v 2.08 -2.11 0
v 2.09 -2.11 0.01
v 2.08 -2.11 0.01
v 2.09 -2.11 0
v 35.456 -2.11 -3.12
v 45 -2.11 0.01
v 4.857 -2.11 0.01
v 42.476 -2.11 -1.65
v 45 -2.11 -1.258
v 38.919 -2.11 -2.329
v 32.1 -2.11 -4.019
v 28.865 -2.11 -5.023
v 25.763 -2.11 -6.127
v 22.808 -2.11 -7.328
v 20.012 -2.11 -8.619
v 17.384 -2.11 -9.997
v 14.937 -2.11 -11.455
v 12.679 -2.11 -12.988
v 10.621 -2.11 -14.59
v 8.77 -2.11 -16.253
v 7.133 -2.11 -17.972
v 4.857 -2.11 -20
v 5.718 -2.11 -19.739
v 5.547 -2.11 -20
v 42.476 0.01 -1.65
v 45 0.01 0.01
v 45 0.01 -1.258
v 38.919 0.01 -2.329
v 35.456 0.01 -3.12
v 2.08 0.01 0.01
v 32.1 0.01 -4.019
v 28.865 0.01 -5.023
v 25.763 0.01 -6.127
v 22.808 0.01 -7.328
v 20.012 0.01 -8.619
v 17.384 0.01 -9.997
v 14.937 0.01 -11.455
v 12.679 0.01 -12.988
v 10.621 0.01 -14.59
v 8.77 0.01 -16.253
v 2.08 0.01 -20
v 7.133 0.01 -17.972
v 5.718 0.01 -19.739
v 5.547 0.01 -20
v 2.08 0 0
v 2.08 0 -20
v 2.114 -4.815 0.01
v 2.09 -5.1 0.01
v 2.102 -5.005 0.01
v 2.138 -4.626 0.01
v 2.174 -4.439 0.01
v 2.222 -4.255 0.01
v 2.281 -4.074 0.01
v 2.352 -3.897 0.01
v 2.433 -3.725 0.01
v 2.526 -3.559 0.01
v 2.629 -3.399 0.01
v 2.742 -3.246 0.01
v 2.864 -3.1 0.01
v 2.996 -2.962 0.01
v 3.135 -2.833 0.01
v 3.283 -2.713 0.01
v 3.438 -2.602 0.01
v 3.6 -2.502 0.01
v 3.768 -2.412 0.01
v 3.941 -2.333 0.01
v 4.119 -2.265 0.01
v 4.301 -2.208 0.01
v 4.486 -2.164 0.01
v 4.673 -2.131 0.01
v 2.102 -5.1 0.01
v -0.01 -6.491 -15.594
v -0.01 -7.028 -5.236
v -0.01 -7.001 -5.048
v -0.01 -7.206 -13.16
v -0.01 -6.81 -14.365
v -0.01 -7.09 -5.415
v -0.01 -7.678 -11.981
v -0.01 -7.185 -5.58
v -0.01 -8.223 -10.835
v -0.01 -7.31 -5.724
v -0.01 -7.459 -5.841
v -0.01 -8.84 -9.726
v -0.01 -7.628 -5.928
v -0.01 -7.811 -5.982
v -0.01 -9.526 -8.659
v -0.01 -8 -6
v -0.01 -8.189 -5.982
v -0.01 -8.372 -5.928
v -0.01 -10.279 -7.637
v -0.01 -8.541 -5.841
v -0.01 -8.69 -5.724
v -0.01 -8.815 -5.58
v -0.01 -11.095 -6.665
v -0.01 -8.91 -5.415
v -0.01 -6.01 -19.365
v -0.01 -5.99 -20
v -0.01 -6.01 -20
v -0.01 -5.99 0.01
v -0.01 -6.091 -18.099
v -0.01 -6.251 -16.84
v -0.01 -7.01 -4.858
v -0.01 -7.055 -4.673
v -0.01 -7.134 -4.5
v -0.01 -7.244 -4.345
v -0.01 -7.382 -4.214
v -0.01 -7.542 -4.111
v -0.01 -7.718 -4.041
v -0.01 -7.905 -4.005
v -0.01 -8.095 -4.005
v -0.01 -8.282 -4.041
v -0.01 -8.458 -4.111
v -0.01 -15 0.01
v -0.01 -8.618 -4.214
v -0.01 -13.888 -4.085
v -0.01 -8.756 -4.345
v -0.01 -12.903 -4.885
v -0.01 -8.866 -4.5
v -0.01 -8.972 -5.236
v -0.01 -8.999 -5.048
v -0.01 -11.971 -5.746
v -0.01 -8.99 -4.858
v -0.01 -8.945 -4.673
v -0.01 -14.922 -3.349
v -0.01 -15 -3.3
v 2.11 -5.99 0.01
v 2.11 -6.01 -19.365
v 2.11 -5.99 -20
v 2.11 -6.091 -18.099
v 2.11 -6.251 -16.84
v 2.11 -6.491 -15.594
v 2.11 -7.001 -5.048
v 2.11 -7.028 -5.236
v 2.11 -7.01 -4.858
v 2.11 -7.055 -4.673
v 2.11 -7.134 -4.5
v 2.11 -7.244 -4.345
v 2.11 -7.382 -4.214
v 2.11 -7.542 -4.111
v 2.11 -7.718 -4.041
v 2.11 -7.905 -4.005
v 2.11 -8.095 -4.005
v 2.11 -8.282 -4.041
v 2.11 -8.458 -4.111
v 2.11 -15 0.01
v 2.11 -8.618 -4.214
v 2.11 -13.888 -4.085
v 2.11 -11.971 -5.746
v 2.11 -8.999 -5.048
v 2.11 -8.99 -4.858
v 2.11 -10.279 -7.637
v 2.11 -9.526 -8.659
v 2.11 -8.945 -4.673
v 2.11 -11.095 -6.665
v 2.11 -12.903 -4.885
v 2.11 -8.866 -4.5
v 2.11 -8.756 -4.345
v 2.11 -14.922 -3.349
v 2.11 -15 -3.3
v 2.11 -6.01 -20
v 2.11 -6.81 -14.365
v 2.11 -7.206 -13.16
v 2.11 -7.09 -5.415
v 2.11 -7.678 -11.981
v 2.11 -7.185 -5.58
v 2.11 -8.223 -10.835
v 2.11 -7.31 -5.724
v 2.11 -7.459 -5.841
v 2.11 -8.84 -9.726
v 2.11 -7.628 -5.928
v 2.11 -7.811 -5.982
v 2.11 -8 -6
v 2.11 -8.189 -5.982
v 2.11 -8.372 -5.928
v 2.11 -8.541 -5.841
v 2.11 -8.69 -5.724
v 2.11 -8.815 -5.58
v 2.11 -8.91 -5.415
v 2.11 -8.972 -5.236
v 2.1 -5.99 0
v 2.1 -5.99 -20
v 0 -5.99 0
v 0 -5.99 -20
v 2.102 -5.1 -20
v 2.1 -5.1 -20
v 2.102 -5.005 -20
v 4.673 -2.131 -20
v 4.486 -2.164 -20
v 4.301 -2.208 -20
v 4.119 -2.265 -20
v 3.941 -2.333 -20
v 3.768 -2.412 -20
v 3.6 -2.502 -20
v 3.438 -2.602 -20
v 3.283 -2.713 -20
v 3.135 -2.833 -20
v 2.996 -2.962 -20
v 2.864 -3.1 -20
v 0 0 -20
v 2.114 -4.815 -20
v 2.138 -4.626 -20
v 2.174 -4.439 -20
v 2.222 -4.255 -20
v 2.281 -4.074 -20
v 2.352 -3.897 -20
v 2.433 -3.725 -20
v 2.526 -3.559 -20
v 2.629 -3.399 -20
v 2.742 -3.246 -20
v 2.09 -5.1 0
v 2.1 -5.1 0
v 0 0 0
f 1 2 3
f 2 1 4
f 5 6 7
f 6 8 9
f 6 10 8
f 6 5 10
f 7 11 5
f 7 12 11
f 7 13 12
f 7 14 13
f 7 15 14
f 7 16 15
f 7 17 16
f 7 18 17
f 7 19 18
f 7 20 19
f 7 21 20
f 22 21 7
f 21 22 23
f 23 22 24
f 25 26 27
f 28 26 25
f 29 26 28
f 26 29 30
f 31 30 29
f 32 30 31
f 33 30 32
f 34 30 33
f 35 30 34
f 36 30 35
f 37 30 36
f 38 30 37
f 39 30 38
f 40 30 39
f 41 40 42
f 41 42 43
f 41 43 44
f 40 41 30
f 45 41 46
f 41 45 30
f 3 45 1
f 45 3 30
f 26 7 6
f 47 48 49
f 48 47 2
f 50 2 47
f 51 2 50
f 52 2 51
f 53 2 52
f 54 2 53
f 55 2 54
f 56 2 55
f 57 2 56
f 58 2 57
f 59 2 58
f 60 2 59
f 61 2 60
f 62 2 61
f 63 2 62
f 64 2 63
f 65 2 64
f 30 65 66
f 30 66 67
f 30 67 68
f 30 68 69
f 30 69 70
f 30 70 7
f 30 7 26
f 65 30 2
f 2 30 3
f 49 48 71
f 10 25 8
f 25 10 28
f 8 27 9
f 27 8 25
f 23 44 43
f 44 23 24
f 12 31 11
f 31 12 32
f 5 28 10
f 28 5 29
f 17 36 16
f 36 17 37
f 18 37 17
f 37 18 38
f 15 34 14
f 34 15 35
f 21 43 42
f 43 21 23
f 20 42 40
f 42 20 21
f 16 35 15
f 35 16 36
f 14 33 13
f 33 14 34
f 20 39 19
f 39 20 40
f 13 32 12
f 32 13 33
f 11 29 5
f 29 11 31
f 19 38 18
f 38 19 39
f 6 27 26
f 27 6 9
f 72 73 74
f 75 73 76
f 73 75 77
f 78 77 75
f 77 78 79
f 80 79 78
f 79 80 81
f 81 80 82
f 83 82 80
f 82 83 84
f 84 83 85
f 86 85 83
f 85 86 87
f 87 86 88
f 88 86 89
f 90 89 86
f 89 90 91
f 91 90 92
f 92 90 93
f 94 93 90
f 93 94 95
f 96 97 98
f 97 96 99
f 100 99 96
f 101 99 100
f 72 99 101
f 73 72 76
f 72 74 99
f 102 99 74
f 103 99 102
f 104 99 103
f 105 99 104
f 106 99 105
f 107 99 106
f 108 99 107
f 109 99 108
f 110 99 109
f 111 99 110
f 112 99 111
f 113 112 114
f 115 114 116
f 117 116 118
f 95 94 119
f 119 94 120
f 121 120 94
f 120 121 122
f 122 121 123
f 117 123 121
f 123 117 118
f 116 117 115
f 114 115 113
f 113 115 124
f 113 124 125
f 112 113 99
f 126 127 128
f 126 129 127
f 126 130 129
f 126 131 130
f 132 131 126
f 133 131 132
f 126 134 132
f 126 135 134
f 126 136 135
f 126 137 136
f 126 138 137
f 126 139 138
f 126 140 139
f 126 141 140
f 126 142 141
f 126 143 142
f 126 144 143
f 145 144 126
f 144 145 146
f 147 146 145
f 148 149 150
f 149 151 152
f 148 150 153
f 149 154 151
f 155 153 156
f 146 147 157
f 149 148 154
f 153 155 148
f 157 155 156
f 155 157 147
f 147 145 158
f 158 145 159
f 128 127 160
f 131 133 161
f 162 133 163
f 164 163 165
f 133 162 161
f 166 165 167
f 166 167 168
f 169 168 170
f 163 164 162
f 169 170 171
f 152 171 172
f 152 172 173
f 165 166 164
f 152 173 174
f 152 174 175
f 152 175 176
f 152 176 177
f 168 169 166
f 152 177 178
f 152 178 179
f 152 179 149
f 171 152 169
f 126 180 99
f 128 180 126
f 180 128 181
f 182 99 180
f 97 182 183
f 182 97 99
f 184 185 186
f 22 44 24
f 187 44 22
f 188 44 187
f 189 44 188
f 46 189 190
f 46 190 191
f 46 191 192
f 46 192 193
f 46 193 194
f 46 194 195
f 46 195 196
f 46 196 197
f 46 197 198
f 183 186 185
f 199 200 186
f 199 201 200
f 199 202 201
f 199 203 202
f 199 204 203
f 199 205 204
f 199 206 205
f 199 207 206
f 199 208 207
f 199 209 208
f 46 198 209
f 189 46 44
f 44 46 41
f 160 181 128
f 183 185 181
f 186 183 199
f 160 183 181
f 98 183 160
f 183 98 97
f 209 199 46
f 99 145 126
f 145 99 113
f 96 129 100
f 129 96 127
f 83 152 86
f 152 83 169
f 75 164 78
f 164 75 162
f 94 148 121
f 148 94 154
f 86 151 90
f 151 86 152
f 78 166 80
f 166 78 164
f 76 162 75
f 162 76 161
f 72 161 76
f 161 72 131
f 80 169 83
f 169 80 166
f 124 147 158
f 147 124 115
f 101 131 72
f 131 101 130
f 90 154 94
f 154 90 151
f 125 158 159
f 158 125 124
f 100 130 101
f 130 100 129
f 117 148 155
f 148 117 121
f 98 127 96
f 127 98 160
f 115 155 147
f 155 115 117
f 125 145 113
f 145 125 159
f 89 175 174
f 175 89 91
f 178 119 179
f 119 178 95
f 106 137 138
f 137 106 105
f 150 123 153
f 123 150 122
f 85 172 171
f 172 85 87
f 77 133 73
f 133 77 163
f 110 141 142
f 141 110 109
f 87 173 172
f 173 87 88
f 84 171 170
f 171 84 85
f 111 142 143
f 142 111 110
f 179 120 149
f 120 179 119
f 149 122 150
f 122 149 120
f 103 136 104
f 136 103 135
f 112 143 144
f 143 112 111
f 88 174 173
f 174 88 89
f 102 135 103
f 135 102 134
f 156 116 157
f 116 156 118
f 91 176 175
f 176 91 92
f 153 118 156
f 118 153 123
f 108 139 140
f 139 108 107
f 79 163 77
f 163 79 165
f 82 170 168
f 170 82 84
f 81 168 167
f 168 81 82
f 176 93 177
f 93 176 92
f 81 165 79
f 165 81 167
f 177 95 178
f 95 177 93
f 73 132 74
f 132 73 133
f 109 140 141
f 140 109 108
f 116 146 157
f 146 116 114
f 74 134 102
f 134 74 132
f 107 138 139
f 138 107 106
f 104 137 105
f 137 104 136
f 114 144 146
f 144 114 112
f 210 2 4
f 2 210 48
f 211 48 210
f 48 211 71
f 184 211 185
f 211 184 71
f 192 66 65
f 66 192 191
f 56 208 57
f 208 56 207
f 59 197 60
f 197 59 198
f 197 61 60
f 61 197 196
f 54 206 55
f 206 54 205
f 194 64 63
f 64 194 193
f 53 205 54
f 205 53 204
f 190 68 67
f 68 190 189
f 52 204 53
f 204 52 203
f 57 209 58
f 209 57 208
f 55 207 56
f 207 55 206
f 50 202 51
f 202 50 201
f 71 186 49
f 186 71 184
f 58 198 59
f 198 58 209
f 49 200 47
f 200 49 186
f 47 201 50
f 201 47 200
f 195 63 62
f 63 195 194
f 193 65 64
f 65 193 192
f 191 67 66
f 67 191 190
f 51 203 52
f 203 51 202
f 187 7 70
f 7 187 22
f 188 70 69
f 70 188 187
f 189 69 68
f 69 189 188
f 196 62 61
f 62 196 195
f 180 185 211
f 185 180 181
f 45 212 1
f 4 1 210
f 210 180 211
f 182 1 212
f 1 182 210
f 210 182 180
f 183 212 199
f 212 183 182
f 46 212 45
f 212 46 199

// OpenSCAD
// file: ../Parts/rounder.scad
// rounder.scad
// cutting tool for rounding off corners with a cylinder

//---------------------
module rounder(
r=10,   // radius
h=10,   // height
f=22,    // $fn
extra=0.01  // extra size for the cube
){

difference(){
  translate([-extra,-extra,-extra])
  cube([r+extra,r+extra,h+2*extra]);
  translate([r,r,-1])
  cylinder(r=r,h=h+2,$fn=f);
}

}

//---------------------------------------------------------------------------
module bevel(x=1,y=1,h=10){

linear_extrude(height=h)
polygon(points=[[0,0],[x,0],[0,y]]);
    
}
  

//========================

rounder();

//========================
// main file
//======================================================================
// SpeakerBracket.scad
// 
// Bracket for kitchen tweeters
//
// DrTomFlint 12 Sept 2023
//======================================================================

thick=2.1;
wide = 80;
use <../Parts/rounder.scad>

//----------------------------------------------------------------------
module top(){

  difference(){
    union(){
      translate([0,0,0])
      cube([105,wide,thick]);
      translate([0,0,thick])
      cube([104,thick,thick]);
      translate([0,wide-thick,thick])
      cube([104,thick,thick]);
      translate([105-thick,0,thick])
      cube([thick,wide,thick]);
    }

    translate([0,thick,+thick/2])
    side(tol=0.2);

    translate([0,wide-thick,+thick/2])
    mirror([0,1,0])
    side(tol=0.2);
    
    translate([105/2,wide/2,-2])
    linear_extrude(height=5)
    offset(r=5,$fn=99)
    square([70,45],center=true);
    
    translate([105,0,-2])
    rotate([0,0,90])
    rounder(r=2,h=10,f=33);
    translate([105,wide,-2])
    rotate([0,0,180])
    rounder(r=2,h=10,f=33);
    
  }



}

//----------------------------------------------------------------------
module side(tol=0){

  difference(){
    translate([thick,0,0])
    scale([2,1,1])
    rotate([-90,0,0])
    rounder(r=30,h=thick+tol,f=99);
    translate([45,-5,-5])
    cube([20,10,10]);
  }
    
  translate([0,0,-30])
  cube([thick+tol,6+tol,30]);

  difference(){
    translate([thick,6,0])
    scale([1,1,1])
    rotate([0,0,90])
    rotate([-90,0,0])
    rounder(r=20,h=thick+tol,f=99);

    translate([-thick,15,-8])
    cube([3*thick,15,10]);
    
    translate([0,8,-5])
    rotate([0,90,0])
    cylinder(r=1.0,h=10,center=true,$fn=33);
  }

  translate([thick,thick,-20])
  rounder(r=3+tol,h=20,f=99);
}

//======================================================================

//top();

//translate([0,thick,+thick/2])
mirror([0,1,0])
difference(){
  side(tol=0);
  translate([-1,-1,-40])
  cube([20,20,20]);
}

//translate([0,wide-thick,+thick/2])
//mirror([0,1,0])
//side();
  
//======================================================================
